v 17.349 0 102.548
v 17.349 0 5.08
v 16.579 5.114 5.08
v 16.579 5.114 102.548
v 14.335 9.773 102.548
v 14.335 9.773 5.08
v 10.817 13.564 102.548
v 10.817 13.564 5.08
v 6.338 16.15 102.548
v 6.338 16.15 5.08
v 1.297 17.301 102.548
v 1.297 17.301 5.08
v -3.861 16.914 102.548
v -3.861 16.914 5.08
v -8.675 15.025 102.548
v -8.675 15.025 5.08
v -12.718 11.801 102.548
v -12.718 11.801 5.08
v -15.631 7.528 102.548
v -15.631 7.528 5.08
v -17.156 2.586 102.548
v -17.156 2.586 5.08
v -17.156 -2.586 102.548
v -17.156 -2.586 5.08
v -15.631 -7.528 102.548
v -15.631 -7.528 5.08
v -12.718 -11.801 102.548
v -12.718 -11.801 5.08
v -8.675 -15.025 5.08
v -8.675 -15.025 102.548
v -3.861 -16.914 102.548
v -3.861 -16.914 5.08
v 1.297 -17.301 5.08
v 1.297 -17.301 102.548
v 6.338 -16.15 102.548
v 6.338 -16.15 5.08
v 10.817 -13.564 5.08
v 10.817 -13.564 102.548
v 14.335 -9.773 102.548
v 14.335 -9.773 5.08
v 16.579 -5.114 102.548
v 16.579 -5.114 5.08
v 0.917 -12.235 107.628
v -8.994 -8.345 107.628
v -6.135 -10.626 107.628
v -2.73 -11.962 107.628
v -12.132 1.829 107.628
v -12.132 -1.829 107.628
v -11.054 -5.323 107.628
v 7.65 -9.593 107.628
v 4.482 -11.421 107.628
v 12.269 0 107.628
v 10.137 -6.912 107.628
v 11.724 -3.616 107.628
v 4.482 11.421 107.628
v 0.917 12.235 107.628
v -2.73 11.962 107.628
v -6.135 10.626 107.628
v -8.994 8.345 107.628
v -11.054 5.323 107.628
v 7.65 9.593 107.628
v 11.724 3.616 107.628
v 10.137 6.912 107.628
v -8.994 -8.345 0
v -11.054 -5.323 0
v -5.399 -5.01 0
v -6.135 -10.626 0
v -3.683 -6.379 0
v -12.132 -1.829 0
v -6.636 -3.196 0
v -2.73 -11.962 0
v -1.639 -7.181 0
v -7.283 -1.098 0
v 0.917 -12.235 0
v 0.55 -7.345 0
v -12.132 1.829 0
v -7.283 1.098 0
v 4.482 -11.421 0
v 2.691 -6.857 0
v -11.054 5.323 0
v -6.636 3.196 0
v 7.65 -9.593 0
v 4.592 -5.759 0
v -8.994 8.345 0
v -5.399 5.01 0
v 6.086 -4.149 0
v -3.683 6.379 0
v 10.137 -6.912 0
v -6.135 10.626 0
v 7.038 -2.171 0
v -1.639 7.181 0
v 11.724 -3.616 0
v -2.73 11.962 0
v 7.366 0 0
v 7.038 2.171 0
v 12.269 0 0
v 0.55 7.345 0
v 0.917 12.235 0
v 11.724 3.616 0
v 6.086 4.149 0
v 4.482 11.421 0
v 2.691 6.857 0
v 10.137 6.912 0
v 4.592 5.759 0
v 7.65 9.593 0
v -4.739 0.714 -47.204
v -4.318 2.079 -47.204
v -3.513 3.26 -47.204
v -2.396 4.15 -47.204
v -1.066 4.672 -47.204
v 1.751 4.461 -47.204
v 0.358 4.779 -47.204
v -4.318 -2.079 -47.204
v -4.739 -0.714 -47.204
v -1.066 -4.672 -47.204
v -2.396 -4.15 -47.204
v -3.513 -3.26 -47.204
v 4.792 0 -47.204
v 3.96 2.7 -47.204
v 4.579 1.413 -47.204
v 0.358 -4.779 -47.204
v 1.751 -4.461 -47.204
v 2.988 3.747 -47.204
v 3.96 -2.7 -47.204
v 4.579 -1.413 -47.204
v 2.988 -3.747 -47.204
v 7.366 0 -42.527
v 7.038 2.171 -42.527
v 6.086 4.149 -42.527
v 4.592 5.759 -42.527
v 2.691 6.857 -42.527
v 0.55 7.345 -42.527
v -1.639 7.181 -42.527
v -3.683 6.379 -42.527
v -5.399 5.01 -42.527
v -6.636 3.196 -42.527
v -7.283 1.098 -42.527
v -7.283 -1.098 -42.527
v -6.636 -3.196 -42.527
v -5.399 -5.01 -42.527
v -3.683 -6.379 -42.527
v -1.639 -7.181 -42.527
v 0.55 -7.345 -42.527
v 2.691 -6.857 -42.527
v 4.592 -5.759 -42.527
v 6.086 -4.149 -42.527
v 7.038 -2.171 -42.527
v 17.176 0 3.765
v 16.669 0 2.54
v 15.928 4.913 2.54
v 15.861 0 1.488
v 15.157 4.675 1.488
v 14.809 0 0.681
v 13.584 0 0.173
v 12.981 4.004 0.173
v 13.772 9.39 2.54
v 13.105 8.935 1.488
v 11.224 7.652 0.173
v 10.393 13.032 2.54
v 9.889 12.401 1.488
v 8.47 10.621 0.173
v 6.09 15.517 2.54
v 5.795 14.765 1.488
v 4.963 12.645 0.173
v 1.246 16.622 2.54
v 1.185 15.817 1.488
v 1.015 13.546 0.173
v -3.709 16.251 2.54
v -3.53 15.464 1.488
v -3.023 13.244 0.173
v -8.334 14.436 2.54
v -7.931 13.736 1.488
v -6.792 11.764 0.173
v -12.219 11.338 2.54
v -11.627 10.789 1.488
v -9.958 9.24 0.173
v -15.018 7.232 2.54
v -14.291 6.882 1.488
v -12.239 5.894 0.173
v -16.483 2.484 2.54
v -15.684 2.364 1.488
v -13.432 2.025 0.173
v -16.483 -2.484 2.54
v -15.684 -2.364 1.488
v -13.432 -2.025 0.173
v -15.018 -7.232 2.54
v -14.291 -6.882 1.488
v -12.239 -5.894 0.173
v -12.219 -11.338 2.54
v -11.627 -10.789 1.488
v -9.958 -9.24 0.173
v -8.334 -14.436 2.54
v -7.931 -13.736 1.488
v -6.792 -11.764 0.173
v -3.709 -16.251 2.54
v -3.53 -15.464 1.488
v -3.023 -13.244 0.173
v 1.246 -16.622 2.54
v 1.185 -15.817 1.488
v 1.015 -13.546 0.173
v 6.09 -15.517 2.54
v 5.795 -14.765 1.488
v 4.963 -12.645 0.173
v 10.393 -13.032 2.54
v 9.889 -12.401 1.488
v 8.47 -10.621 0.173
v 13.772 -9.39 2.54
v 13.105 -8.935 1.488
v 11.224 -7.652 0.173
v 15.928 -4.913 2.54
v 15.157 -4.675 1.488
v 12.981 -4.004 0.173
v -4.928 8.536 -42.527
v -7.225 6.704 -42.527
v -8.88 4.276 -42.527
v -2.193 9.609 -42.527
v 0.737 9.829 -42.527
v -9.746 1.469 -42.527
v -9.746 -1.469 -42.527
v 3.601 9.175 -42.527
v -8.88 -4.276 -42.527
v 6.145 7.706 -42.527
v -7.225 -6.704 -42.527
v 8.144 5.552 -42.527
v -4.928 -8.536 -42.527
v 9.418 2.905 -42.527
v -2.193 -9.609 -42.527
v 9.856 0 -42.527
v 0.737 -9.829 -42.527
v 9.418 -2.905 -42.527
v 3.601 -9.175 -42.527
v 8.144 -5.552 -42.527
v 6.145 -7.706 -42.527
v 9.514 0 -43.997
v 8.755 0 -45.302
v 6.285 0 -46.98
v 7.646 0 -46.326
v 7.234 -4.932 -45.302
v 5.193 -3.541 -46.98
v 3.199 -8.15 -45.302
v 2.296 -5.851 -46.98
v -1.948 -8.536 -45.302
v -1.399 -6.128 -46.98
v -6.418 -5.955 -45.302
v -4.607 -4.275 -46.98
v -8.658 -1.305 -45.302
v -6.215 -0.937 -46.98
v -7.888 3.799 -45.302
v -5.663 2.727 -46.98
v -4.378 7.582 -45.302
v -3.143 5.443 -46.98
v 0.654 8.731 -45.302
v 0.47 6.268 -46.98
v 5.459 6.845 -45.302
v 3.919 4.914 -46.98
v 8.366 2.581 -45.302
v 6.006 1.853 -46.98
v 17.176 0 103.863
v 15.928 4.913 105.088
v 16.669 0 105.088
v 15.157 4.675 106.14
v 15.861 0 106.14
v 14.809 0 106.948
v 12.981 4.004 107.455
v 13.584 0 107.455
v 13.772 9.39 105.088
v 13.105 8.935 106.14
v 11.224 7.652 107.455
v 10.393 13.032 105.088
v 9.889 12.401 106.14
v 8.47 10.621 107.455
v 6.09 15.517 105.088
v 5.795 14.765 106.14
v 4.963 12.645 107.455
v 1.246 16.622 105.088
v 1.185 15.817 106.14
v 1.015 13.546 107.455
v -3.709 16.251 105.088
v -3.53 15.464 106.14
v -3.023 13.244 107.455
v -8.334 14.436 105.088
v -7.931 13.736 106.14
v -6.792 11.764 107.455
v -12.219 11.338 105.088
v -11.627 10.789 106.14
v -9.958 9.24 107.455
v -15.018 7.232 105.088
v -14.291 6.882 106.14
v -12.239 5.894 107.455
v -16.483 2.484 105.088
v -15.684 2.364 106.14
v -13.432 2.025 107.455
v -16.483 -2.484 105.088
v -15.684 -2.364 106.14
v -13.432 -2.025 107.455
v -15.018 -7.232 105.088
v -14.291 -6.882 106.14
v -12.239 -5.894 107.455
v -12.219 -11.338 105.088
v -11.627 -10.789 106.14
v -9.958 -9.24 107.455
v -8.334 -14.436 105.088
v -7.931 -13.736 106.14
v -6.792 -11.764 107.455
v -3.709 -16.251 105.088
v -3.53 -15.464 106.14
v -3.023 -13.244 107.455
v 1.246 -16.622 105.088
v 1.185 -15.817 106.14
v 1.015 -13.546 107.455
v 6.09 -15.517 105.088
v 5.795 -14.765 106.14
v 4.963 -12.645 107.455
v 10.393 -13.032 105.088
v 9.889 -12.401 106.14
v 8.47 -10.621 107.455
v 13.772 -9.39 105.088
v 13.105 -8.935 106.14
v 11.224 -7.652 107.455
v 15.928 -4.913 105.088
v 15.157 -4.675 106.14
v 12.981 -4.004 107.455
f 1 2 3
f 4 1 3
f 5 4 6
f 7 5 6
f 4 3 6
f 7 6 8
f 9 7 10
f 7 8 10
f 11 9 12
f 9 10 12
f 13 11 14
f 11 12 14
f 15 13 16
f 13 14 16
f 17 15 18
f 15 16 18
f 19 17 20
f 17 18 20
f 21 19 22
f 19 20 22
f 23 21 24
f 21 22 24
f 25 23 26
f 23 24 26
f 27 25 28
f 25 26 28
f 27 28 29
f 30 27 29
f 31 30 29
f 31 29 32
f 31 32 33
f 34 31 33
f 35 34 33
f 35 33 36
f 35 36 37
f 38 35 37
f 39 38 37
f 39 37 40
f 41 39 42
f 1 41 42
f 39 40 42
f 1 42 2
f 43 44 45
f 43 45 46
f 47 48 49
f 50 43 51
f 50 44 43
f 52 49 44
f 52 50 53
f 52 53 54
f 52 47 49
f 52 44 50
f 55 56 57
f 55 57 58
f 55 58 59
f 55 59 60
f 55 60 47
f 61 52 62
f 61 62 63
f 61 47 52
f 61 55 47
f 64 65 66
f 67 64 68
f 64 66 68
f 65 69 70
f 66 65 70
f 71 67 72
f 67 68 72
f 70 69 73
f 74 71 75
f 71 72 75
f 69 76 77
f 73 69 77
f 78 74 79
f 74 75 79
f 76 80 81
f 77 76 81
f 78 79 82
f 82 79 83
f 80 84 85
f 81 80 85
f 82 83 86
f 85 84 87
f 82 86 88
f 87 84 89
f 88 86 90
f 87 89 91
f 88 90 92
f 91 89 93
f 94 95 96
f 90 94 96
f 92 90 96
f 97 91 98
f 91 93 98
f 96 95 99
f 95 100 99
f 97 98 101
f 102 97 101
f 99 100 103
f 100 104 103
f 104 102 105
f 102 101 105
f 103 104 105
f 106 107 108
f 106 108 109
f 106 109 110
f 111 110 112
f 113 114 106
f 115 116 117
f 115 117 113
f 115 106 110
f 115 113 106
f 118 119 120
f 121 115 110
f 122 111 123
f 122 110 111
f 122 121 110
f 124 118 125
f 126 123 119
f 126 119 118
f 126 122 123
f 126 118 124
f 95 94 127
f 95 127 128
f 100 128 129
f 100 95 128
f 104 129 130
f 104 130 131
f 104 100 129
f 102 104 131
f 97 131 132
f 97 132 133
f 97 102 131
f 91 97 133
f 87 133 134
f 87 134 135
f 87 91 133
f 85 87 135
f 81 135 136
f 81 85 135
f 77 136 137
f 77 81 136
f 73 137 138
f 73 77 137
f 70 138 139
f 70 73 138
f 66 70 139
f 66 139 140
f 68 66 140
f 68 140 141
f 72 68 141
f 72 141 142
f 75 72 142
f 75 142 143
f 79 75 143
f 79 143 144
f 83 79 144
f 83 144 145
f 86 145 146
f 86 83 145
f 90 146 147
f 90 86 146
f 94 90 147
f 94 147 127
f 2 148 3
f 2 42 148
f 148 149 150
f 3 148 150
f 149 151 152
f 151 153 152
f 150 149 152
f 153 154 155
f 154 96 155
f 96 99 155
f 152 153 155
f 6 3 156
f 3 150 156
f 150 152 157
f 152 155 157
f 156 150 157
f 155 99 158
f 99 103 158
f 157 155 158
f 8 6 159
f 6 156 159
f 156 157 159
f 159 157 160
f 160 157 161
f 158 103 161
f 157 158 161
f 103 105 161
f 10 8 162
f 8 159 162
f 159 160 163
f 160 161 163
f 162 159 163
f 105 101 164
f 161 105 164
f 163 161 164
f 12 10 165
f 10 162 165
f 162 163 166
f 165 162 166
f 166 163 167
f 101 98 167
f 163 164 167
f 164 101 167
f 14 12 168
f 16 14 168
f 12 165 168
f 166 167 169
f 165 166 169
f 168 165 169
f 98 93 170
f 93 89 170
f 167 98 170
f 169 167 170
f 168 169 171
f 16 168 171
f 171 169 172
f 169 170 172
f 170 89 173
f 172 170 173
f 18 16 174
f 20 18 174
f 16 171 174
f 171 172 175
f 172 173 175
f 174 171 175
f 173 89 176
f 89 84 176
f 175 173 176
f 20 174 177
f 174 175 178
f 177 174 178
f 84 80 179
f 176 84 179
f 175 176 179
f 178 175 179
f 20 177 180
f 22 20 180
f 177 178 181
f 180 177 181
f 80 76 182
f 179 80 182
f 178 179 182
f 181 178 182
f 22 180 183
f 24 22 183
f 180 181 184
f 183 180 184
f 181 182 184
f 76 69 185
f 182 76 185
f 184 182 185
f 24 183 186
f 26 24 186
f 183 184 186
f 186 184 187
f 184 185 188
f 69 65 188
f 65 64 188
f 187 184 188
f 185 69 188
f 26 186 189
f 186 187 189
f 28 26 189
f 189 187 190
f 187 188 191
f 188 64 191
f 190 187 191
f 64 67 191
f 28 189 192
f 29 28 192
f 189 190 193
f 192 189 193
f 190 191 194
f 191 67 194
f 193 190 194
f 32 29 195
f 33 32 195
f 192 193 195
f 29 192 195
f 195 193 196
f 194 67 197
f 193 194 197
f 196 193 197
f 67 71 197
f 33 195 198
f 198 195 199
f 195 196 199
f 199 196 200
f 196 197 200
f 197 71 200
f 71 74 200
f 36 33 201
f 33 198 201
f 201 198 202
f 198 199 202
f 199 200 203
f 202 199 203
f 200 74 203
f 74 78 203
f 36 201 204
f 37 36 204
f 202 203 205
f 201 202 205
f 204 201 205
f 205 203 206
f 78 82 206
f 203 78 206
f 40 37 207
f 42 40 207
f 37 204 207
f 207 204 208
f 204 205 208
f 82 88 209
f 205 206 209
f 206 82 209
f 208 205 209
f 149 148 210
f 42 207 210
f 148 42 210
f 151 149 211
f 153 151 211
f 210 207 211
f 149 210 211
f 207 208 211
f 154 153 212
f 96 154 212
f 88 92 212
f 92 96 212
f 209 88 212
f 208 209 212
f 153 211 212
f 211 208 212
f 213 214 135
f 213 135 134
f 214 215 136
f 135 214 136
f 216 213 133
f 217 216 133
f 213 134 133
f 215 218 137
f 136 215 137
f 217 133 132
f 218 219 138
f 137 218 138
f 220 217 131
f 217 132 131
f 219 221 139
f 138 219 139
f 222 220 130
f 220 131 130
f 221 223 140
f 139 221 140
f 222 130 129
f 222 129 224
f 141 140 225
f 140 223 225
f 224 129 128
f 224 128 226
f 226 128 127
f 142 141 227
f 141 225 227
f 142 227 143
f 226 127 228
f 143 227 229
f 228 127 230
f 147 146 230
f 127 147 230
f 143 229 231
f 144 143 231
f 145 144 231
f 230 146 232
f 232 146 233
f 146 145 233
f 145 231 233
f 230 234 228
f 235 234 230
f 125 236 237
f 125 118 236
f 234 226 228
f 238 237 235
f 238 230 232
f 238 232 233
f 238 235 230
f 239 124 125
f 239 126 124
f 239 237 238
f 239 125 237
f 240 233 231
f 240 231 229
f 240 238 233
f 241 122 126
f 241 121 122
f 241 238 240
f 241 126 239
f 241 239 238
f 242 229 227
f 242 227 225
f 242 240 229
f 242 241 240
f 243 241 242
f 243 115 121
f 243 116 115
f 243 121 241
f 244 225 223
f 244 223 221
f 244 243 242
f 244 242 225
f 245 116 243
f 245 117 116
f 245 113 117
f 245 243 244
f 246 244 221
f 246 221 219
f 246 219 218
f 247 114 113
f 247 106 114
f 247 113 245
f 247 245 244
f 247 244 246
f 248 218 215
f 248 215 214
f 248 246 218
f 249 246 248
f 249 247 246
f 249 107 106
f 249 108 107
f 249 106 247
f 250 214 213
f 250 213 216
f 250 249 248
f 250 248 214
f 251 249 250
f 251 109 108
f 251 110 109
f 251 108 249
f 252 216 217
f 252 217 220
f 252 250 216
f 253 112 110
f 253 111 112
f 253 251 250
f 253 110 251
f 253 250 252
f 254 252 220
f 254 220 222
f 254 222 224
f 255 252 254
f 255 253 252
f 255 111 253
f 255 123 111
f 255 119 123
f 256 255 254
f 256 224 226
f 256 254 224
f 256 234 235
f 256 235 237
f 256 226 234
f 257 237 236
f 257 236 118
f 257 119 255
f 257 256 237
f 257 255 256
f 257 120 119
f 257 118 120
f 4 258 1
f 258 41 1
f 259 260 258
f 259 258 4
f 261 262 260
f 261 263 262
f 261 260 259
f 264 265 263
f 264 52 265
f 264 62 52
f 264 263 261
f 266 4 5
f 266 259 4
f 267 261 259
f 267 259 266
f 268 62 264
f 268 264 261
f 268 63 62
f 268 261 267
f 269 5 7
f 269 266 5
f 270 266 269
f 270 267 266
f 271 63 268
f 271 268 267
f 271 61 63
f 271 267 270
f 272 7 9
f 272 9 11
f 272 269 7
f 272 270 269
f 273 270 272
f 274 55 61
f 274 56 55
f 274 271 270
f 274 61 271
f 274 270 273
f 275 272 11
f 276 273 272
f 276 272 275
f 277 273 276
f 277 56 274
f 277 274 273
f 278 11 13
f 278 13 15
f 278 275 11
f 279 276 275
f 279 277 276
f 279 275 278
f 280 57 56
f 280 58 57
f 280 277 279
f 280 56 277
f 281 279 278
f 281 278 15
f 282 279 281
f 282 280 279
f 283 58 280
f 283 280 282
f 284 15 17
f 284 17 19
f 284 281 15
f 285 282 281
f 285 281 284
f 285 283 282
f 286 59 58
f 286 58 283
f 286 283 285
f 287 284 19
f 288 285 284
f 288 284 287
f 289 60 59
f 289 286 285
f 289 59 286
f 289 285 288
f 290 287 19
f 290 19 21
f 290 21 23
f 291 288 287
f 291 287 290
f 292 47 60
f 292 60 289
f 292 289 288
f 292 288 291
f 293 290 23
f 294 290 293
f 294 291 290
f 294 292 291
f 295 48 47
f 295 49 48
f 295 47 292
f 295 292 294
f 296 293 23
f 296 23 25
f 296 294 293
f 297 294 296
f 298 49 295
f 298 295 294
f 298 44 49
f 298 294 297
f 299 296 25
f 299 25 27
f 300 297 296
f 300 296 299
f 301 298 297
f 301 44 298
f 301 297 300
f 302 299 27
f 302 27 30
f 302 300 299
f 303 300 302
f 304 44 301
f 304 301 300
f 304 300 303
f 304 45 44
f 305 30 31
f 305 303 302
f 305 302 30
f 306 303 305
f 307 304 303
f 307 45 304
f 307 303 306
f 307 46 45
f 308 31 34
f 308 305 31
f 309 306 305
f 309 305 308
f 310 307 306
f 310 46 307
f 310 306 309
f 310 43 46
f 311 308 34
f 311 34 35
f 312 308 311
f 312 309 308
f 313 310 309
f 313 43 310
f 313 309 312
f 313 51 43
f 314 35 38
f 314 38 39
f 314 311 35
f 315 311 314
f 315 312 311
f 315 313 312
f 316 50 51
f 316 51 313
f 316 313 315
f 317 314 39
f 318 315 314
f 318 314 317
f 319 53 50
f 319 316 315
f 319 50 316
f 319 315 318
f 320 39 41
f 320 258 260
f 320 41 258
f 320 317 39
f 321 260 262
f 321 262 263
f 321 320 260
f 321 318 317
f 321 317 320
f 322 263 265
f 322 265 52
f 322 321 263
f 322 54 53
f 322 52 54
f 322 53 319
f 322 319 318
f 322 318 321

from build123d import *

# Parameters (mm, degrees)
F0_R     = 17.3493533367
F1_DEPTH = 107.62834
F2_R     = 5.08
F3_R     = 5.08
F4_R     = 7.3657213081
F5_DEPTH = 42.52659
F6_R     = 9.8562945963
F7_DEPTH = 4.6773


# Not quite as in the source:
# - a fillet or chamfer that OpenCascade refuses, or shapes differently, is made with other operations: its cross-section is extruded or revolved along the edge and cut away or added


with BuildPart() as f1:
    # F0 (on Top) → F1 (new body)
    with BuildSketch(Plane.XY):
        Circle(F0_R)
    extrude(amount=F1_DEPTH)

    # F2
    f2_edges = [f1.edges().sort_by_distance(p)[0] for p in [
        (-17.349353, 0, 107.62834),
    ]]
    fillet(f2_edges, radius=F2_R)

    # F3
    f3_edges = [f1.edges().sort_by_distance(p)[0] for p in [
        (-17.349353, 0, 0),
    ]]
    fillet(f3_edges, radius=F3_R)

    # F4 (on Top) → F5 (join)
    with BuildSketch(Plane.XY):
        Circle(F4_R)
    extrude(amount=-F5_DEPTH)

    # F6 (on face) → F7 (join)
    with BuildSketch(Plane(origin=(0, 0, -42.52659), x_dir=(1, 0, 0), z_dir=(0, 0, -1))):
        Circle(F6_R)
    extrude(amount=F7_DEPTH)

    # F8: fillet of radius 5.08 on 1 edges, made by hand

    # F8_s1 → F8_t2 (revolve, cut)
    with BuildSketch(Plane.XZ):
        with BuildLine():
            ThreePointArc((9.8562945963, -42.52659), (8.2390682978, -45.8556533901), (4.7922810981, -47.20389))
            Line((4.7922810981, -47.20389), (9.8562945963, -47.20389))
            Line((9.8562945963, -47.20389), (9.8562945963, -42.52659))
        make_face()
    revolve(axis=Axis((0, 0, -47.20389), (0, 0, -1)), mode=Mode.SUBTRACT)


solid = f1.part
